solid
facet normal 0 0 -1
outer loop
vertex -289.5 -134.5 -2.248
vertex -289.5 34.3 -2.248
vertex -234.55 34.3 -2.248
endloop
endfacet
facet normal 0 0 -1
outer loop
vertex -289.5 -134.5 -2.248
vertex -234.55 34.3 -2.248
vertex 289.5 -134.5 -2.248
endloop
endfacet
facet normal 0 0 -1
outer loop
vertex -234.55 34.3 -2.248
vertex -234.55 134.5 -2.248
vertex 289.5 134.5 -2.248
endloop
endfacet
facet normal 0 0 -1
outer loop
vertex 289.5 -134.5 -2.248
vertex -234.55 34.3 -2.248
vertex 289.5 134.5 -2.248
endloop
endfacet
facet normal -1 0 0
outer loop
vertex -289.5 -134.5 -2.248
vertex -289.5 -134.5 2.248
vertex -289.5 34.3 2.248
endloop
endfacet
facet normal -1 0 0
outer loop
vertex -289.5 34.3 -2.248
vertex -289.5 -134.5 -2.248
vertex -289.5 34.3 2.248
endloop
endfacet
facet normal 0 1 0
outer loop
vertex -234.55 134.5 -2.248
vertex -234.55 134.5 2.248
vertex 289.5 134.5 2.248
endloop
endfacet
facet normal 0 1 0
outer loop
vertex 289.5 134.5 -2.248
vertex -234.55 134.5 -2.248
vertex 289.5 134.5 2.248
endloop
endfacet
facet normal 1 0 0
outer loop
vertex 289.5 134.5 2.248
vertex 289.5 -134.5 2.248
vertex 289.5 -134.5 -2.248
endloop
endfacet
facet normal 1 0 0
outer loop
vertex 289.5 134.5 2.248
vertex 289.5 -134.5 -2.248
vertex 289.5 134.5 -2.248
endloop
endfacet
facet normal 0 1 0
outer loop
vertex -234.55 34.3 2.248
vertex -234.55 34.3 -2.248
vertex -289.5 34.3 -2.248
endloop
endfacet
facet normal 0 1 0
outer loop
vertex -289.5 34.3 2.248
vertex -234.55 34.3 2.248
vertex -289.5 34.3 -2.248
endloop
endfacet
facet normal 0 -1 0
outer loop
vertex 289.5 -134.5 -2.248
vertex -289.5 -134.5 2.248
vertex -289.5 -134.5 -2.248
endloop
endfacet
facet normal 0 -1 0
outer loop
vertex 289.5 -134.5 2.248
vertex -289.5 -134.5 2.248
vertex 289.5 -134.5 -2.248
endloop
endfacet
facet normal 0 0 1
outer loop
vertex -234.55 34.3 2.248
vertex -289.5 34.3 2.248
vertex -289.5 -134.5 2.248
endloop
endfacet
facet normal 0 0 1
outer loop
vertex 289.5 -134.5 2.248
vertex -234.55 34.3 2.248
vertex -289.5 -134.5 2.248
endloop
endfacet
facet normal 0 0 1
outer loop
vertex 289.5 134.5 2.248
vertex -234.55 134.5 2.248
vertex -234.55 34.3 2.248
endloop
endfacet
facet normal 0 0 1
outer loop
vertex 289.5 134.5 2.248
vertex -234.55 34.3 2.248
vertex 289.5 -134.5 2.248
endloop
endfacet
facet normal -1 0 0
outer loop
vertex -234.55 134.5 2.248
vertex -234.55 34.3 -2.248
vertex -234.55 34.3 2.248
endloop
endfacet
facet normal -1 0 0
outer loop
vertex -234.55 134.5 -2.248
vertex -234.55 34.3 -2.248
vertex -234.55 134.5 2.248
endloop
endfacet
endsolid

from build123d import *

# Parameters (mm, degrees)
SKETCH1_W           = 579
SKETCH1_H           = 269
BOSS_EXTRUDE1_DEPTH = 2.2479
SKETCH2_W           = 54.949993563
SKETCH2_H           = 100.2
CUT_EXTRUDE1_DEPTH  = 4.4958


with BuildPart() as part:
    # Sketch1 → Boss-Extrude1 (new body, symmetric)
    with BuildSketch(Plane.XY):
        Rectangle(SKETCH1_W, SKETCH1_H)
    extrude(amount=BOSS_EXTRUDE1_DEPTH, both=True)

    # Sketch2 → Cut-Extrude1 (cut)
    with BuildSketch(Plane(origin=(0, 0, -2.2479), x_dir=(-1, 0, 0), z_dir=(0, 0, -1))):
        with Locations((262.025003218, 84.4)):
            Rectangle(SKETCH2_W, SKETCH2_H)
    extrude(amount=-CUT_EXTRUDE1_DEPTH, mode=Mode.SUBTRACT)


solid = part.part
